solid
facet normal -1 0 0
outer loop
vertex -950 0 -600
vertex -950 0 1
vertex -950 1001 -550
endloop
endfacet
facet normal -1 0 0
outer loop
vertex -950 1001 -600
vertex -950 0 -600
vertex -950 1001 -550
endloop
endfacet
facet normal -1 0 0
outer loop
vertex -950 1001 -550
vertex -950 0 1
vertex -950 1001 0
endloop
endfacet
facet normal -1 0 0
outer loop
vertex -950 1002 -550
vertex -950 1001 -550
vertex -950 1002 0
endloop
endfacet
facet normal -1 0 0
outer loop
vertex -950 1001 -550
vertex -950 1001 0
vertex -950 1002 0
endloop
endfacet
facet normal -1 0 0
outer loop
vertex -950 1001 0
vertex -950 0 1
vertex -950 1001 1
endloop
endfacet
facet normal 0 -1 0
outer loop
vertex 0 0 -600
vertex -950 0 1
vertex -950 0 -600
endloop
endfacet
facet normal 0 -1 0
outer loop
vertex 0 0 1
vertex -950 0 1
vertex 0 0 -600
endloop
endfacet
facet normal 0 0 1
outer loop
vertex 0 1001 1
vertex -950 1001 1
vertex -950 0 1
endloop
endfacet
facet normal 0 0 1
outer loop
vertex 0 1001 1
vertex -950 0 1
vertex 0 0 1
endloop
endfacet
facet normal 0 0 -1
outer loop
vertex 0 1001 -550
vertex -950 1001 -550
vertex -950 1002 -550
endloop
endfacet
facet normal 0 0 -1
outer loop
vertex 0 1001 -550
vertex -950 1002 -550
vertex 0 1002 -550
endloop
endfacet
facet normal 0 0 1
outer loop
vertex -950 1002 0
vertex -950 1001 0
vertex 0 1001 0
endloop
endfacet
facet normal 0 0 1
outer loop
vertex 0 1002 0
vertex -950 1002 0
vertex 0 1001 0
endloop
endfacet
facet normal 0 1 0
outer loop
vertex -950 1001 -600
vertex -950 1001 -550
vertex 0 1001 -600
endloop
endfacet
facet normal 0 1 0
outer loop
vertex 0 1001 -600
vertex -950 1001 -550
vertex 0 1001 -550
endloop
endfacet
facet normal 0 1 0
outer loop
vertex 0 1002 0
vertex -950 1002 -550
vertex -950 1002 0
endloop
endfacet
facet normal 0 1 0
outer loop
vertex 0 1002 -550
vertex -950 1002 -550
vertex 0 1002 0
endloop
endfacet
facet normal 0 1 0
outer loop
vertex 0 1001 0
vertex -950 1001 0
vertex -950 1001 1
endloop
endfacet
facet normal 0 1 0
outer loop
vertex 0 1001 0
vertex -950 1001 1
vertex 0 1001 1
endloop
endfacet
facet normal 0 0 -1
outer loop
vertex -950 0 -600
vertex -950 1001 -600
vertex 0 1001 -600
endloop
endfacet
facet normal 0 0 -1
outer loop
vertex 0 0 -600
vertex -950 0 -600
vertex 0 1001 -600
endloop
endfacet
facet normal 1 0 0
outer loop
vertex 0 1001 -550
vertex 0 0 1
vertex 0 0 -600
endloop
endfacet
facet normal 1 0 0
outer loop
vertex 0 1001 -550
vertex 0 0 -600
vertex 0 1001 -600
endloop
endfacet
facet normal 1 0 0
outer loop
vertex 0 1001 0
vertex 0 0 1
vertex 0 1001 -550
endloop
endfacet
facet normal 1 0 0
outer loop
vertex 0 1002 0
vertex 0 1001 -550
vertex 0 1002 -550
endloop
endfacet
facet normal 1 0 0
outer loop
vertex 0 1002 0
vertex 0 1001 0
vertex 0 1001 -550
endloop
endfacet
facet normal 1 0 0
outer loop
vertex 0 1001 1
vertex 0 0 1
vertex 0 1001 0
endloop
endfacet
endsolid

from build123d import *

# Parameters (mm, degrees)
SKETCH_1_W      = 950
SKETCH_1_H      = 550
EXTRUDE_1_DEPTH = 1
SKETCH_2_W      = 950
SKETCH_2_H      = 550
EXTRUDE_2_DEPTH = 1
SKETCH_3_W      = 950
SKETCH_3_H      = 1001
EXTRUDE_3_DEPTH = 1
SKETCH_3_2_W    = 950
SKETCH_3_2_H    = 1001
EXTRUDE_4_DEPTH = 600


with BuildPart() as part:
    # 草图1 → 凸台-拉伸1 (new body)
    with BuildSketch(Plane(origin=(0, 0, 0), x_dir=(1, 0, 0), z_dir=(0, 1, 0))):
        with Locations((-475, 275)):
            Rectangle(SKETCH_1_W, SKETCH_1_H)
    extrude(amount=EXTRUDE_1_DEPTH)

    # 草图3 → 凸台-拉伸3 (add)
    with BuildSketch(Plane.XY):
        with Locations((-475, 500.5)):
            Rectangle(SKETCH_3_W, SKETCH_3_H)
    extrude(amount=EXTRUDE_3_DEPTH)



with BuildPart() as body_2:
    # 草图2 → 凸台-拉伸2 (new body)
    with BuildSketch(Plane(origin=(0, 1001, 0), x_dir=(1, 0, 0), z_dir=(0, 1, 0))):
        with Locations((-475, 275)):
            Rectangle(SKETCH_2_W, SKETCH_2_H)
    extrude(amount=EXTRUDE_2_DEPTH)


with BuildPart() as part_1:
    add(part.part)

    add(body_2.part)  # 凸台-拉伸4 merges body 2
    # 草图3<2> → 凸台-拉伸4 (add)
    with BuildSketch(Plane.XY):
        with Locations((-475, 500.5)):
            Rectangle(SKETCH_3_2_W, SKETCH_3_2_H)
    extrude(amount=-EXTRUDE_4_DEPTH)


solid = part_1.part
